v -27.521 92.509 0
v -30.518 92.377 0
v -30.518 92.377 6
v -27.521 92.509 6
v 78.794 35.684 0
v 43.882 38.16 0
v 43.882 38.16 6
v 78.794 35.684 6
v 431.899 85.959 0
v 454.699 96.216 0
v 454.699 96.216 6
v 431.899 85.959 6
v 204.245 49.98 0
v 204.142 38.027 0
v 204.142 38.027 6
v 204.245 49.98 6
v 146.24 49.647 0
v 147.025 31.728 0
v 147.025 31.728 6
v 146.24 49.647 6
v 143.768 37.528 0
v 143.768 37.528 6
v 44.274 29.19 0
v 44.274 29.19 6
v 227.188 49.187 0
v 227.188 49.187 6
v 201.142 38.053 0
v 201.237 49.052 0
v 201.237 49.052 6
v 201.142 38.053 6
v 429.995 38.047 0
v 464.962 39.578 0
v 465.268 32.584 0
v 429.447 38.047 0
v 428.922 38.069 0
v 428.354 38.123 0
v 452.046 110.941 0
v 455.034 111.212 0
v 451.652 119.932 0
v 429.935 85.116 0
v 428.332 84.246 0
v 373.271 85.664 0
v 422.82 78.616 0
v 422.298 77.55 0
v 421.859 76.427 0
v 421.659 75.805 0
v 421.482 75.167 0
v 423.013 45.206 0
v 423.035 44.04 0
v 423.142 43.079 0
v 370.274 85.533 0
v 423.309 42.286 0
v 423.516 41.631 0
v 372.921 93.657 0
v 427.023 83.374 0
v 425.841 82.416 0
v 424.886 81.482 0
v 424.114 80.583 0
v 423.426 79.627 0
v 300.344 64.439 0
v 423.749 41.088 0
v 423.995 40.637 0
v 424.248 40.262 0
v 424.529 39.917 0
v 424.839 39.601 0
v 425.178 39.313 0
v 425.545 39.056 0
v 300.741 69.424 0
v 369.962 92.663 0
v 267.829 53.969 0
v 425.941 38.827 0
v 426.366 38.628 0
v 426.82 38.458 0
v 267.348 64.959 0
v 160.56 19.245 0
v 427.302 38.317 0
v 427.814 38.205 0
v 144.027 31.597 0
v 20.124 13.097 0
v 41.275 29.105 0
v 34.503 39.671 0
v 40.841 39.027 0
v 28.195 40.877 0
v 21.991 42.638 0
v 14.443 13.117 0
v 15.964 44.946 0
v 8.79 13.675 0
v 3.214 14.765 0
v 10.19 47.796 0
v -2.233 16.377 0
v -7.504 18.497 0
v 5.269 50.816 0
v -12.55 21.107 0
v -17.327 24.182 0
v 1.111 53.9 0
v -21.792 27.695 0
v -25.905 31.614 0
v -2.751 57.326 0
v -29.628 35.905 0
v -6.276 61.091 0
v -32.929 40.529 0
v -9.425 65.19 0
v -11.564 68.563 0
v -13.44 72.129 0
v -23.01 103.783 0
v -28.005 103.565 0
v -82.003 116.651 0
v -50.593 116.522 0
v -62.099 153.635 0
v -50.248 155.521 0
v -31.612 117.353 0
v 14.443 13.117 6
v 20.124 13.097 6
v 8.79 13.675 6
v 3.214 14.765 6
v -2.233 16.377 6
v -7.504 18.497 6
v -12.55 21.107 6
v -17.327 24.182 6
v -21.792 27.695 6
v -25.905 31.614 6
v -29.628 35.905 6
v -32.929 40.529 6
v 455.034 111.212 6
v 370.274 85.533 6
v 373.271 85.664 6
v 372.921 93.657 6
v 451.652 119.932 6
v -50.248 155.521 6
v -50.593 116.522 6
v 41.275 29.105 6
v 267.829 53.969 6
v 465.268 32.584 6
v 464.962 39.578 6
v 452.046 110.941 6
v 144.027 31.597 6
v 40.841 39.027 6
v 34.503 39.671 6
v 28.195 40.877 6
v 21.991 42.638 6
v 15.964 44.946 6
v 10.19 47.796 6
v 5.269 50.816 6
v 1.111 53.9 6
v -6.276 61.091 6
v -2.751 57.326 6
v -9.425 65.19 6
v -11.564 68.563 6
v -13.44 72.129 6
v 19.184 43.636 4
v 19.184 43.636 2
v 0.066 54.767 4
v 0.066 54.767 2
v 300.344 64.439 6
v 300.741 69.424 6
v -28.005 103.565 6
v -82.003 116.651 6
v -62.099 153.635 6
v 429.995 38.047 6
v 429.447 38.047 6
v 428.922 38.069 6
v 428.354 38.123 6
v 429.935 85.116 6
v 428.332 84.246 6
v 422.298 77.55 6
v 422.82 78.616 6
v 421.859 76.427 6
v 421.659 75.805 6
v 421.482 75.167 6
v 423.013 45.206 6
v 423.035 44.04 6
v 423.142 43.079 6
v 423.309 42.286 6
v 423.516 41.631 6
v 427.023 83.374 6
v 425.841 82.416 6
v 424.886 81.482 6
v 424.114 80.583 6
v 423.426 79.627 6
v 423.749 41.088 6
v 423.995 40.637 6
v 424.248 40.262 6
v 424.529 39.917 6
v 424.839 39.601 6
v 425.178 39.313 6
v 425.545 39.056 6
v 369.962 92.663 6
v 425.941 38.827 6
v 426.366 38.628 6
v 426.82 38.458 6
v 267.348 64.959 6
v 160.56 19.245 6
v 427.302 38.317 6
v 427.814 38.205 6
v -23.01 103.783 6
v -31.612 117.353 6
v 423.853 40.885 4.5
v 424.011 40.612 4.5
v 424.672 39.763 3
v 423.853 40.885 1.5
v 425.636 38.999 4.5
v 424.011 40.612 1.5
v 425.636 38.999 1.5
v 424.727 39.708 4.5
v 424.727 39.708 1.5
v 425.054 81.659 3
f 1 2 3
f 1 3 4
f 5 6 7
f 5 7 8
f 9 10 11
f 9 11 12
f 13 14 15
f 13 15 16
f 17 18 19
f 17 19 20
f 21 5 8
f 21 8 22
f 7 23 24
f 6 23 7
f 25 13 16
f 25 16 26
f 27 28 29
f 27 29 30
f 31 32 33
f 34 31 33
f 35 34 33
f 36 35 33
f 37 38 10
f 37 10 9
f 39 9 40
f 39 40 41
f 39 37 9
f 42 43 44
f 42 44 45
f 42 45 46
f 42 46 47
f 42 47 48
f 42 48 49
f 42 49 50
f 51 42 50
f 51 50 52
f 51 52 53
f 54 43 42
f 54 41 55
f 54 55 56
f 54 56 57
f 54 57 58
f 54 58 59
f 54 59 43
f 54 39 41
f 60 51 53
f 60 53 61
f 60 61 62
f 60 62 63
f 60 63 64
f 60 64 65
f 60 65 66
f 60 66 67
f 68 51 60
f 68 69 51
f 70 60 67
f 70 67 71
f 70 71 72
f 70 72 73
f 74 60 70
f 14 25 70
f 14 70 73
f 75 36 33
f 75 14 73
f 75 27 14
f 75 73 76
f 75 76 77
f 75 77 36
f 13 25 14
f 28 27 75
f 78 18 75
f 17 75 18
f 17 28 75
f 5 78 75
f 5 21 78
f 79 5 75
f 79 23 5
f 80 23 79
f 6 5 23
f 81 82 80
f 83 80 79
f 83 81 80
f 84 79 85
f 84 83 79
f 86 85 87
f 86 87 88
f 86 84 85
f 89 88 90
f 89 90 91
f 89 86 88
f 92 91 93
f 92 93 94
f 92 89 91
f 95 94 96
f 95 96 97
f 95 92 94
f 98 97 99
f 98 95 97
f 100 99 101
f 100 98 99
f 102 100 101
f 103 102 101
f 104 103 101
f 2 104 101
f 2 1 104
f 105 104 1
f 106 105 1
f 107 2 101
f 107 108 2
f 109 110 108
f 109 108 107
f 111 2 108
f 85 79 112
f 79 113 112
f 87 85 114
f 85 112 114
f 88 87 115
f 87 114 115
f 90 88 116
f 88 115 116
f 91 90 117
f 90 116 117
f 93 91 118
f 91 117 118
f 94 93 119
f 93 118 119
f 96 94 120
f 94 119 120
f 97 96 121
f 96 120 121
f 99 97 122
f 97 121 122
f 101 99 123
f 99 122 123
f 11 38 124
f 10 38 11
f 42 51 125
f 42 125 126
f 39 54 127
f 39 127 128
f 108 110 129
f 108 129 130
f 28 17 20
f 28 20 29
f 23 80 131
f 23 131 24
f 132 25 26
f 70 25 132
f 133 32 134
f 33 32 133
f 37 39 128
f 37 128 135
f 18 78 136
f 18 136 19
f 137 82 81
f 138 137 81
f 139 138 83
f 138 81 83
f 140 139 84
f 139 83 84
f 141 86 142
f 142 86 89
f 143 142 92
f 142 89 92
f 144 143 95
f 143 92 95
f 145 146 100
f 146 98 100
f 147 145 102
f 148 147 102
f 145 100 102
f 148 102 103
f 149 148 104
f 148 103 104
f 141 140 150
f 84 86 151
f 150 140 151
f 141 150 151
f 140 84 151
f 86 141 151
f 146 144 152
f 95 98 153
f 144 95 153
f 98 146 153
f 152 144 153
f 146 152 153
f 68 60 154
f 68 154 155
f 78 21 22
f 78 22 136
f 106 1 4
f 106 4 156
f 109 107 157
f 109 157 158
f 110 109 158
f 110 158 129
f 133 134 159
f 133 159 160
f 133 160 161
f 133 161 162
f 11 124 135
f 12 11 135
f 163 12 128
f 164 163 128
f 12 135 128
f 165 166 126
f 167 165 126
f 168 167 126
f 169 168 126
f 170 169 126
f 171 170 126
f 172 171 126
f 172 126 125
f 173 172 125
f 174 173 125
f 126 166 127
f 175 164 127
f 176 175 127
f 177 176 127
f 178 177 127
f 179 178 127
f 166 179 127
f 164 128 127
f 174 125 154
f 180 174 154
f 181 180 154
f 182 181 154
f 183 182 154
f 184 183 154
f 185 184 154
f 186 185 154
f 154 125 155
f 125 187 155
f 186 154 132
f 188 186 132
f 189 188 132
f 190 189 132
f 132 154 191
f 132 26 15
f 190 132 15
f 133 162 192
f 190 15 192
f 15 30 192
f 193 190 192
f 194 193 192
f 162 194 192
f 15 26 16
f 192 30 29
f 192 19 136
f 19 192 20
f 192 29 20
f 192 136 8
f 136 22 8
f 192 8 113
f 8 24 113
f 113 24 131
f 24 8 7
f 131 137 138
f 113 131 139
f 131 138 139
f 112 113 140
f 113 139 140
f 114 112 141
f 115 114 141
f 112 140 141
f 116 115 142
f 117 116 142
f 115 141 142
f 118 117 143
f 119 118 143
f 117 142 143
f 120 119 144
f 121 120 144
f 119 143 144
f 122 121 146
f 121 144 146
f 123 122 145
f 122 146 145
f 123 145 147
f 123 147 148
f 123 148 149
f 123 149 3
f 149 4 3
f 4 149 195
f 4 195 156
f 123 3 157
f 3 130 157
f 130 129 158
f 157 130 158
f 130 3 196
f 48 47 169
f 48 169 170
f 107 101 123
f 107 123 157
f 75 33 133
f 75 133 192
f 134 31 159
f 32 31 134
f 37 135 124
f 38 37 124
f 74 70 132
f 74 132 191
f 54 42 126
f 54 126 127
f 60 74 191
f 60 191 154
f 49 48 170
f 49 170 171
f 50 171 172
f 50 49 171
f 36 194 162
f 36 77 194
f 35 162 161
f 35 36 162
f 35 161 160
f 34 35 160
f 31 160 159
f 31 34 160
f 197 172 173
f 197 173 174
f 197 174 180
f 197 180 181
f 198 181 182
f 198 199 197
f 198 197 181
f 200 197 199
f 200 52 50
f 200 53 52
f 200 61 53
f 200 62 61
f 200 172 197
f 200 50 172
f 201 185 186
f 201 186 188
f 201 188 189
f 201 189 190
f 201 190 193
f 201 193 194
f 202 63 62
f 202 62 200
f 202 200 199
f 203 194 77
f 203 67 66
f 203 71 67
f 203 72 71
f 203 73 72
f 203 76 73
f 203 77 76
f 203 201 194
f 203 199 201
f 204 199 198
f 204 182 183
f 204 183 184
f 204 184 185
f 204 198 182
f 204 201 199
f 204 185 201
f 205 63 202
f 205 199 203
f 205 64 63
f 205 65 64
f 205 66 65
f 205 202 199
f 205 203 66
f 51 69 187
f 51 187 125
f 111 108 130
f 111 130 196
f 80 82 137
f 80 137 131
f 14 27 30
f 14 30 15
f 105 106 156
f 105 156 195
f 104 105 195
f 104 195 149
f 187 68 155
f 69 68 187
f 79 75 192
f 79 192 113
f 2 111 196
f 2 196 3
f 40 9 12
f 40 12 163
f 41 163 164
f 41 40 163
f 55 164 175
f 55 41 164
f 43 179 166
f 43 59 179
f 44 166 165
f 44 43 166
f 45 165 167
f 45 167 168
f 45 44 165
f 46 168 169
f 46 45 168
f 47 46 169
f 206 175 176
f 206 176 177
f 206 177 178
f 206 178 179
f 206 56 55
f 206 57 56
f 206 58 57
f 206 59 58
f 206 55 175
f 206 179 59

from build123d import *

# Parameters (mm, degrees)
BOSS_EXTRU_3_DEPTH = 6
CONG_1_R           = 60


with BuildPart() as part:
    # Esquisse3 → Boss.-Extru.3 (new body)
    with BuildSketch(Plane(origin=(-3.638307048, 7.762911288, 0), x_dir=(0.984807753012208, -0.1736481776669307, 0), z_dir=(0, 0, 1))):
        with BuildLine():
            Line((-71.559692406, 137.419515489), (-65.127612513, 98.953577983))
            Line((-65.127612513, 98.953577983), (-46.578471081, 103.06810738))
            Line((-46.578471081, 103.06810738), (-41.164616612, 78.661342338))
            Line((-41.164616612, 78.661342338), (-38.235804807, 79.311004874))
            Line((-38.235804807, 79.311004874), (-40.632352311, 90.115131983))
            Line((-40.632352311, 90.115131983), (-35.750999303, 91.197902877))
            Line((-35.750999303, 91.197902877), (-20.829774243, 61.686423244))
            add(Edge.make_bspline(
                [(38.37456384, 38.513359507), (16.587805448, 35.939302498), (-7.762740615, 43.297007319), (-20.829774243, 61.686423244)],
                knots=[0, 0, 0, 0, 1, 1, 1, 1], degree=3))
            Line((38.37456384, 38.513359507), (40.525402219, 28.816939468))
            Line((40.525402219, 28.816939468), (43.463887608, 29.421342988))
            Line((43.463887608, 29.421342988), (41.519581302, 38.186674133))
            Line((41.519581302, 38.186674133), (76.331388066, 41.811327195))
            Line((76.331388066, 41.811327195), (139.998021134, 54.909412313))
            Line((139.998021134, 54.909412313), (141.283555233, 49.113961235))
            Line((141.283555233, 49.113961235), (144.212367038, 49.763623772))
            Line((144.212367038, 49.763623772), (140.328182794, 67.274322069))
            Line((140.328182794, 67.274322069), (194.592792235, 76.238258828))
            Line((194.592792235, 76.238258828), (196.409589011, 65.389330334))
            Line((196.409589011, 65.389330334), (199.368387691, 65.884820364))
            Line((199.368387691, 65.884820364), (197.394020749, 77.674672735))
            Line((197.394020749, 77.674672735), (220.126485179, 80.877779775))
            Line((220.126485179, 80.877779775), (259.319797933, 92.644471957))
            Line((259.319797933, 92.644471957), (256.937701966, 103.383448575))
            Line((256.937701966, 103.383448575), (289.522543291, 108.601505288))
            Line((289.522543291, 108.601505288), (289.047470566, 113.57888471))
            Line((289.047470566, 113.57888471), (353.181348825, 148.485449649))
            Line((353.181348825, 148.485449649), (354.726860043, 141.517968462))
            Line((354.726860043, 141.517968462), (357.655671848, 142.167630999))
            Line((357.655671848, 142.167630999), (355.923238418, 149.977795812))
            Line((355.923238418, 149.977795812), (428.895770917, 189.525355795))
            Line((428.895770917, 189.525355795), (430.844758526, 180.73892038))
            Line((430.844758526, 180.73892038), (433.739949932, 181.524965365))
            Line((433.739949932, 181.524965365), (436.014097486, 166.698359115))
            Line((436.014097486, 166.698359115), (415.342101107, 152.638893772))
            add(Edge.make_bspline(
                [(415.342101107, 152.638893772), (407.545289081, 148.009298465), (406.957115975, 140.201368924)],
                knots=[0, 0, 0, 1, 1, 1], degree=2))
            Line((406.957115975, 140.201368924), (413.667773401, 110.961548868))
            add(Edge.make_bspline(
                [(413.667773401, 110.961548868), (414.76605418, 103.736931255), (421.786696865, 105.123477115)],
                knots=[0, 0, 0, 1, 1, 1], degree=2))
            Line((421.786696865, 105.123477115), (455.956167923, 112.702873372))
            Line((455.956167923, 112.702873372), (457.472047174, 105.86897916))
            Line((457.472047174, 105.86897916), (159.709513668, 39.819954639))
            Line((159.709513668, 39.819954639), (-11.137841622, 1.922973356))
            Line((-11.137841622, 1.922973356), (-96.082570909, 93.62571577))
            Line((-96.082570909, 93.62571577), (-82.90301036, 133.504271207))
            Line((-82.90301036, 133.504271207), (-71.559692406, 137.419515489))
        make_face()
    extrude(amount=BOSS_EXTRU_3_DEPTH)

    # Congé1
    cong_1_edges = [part.edges().sort_by_distance(p)[0] for p in [
        (-14.27301901, 11.590736258, 3),
    ]]
    fillet(cong_1_edges, radius=CONG_1_R)


solid = part.part
